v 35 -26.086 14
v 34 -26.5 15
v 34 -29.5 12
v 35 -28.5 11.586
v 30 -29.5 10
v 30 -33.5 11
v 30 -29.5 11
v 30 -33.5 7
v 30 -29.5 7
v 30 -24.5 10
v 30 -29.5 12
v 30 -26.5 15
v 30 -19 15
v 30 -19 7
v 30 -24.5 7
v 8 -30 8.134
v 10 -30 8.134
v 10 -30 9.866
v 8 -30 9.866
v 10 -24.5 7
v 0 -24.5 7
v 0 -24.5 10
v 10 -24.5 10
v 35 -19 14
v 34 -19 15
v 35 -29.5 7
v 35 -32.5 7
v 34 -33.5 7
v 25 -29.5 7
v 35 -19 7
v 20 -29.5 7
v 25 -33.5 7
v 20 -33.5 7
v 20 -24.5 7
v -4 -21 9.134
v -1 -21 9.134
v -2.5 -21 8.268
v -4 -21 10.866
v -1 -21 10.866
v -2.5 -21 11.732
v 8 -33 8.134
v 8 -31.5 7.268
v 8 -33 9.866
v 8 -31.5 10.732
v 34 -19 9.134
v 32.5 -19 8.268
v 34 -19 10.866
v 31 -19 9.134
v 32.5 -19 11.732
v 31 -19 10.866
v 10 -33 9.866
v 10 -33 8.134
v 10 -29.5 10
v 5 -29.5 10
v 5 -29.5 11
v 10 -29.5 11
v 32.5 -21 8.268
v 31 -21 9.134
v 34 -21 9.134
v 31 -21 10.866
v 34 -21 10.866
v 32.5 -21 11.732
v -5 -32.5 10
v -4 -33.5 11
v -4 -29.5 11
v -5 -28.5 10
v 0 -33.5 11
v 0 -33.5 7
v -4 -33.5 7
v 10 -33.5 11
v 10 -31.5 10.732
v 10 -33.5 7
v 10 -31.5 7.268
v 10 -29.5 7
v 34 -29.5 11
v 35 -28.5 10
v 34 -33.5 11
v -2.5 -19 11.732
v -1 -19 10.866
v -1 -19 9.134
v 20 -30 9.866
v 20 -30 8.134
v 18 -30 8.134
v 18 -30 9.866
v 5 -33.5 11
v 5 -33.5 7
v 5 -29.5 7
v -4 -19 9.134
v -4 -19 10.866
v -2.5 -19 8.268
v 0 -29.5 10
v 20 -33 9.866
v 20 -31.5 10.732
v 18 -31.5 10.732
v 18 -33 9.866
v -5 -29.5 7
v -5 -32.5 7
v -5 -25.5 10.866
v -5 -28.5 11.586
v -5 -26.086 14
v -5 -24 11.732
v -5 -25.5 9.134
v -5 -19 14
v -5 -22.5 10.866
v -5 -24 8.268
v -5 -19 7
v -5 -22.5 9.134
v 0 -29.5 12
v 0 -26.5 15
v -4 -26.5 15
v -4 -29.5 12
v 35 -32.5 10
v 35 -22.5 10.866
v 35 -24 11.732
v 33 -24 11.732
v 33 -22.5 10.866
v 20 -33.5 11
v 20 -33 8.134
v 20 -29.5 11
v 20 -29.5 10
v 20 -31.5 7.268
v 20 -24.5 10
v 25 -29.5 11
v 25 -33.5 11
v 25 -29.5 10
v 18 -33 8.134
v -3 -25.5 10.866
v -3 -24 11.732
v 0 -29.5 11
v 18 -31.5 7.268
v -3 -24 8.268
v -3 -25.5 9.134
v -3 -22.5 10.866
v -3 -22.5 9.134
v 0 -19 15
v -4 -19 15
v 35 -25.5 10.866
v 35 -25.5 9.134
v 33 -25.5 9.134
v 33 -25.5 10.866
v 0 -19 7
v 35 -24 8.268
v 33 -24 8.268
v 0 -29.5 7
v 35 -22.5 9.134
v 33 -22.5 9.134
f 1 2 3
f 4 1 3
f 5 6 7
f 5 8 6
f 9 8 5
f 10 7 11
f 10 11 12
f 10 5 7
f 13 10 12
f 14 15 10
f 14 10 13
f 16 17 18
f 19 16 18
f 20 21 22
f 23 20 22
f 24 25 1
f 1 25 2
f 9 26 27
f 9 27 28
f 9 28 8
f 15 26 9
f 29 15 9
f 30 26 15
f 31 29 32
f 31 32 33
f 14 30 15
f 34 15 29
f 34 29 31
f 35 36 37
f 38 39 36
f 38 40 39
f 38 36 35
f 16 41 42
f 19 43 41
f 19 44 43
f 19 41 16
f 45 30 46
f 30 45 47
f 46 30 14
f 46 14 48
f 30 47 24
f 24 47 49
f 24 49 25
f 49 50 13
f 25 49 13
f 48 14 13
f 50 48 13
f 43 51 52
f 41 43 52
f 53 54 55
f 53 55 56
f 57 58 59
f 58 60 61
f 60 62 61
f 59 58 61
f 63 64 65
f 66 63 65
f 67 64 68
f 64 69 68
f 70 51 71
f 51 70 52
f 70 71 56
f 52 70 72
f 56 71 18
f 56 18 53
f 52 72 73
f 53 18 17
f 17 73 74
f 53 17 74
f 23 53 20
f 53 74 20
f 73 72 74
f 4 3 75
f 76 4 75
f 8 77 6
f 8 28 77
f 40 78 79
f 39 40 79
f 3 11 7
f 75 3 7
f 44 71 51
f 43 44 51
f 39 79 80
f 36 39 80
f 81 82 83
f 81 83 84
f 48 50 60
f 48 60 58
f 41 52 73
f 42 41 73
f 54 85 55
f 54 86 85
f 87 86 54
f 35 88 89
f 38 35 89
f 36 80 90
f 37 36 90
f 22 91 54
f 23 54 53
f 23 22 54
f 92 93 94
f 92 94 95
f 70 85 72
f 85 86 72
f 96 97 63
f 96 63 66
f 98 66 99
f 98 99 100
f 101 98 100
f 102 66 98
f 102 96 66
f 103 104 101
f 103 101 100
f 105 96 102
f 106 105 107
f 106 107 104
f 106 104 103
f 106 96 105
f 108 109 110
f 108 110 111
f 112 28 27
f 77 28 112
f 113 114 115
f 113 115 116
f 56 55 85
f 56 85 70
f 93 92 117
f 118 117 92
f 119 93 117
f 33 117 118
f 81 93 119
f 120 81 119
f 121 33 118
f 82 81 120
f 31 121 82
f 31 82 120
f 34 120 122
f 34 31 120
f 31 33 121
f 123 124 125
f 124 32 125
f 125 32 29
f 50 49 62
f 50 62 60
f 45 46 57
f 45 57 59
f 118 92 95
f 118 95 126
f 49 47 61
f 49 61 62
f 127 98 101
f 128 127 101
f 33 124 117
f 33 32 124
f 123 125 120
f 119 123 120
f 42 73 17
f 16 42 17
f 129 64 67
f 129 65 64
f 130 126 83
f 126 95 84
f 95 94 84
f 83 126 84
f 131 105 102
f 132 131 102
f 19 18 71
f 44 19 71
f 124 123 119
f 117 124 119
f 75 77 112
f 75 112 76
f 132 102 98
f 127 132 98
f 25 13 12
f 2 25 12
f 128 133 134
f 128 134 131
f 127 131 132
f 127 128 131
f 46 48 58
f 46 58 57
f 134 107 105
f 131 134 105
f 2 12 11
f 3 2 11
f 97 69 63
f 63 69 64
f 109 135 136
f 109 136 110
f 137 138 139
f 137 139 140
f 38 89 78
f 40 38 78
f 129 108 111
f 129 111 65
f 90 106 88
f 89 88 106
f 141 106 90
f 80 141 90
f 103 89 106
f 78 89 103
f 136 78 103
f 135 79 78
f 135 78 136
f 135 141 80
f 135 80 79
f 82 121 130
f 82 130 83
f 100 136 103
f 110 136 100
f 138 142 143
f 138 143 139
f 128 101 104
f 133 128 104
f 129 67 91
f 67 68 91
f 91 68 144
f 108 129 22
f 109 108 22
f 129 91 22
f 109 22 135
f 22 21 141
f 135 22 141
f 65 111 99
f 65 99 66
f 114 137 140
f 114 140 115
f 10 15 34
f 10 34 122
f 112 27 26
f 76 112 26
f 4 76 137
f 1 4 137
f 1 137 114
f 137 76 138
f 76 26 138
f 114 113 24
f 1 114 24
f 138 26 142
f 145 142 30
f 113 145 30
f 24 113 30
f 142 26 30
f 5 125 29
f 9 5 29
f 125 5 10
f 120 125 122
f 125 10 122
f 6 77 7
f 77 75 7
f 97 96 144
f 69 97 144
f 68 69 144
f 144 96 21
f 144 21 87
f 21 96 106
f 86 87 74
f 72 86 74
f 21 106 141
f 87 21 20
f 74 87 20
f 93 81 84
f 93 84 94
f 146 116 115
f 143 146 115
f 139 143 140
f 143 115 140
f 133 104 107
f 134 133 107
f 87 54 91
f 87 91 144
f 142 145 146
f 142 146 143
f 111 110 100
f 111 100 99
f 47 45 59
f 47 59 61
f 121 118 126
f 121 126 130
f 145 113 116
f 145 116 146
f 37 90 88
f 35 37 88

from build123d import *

# Parameters (mm, degrees)
F0_W       = 4
F0_H       = 3.0000000403
F1_DEPTH   = 5
F2_DEPTH   = 10
F3_W       = 5
F3_H       = 3.0000000403
F4_DEPTH   = 4
F5_W       = 5
F5_H       = 4
F6_DEPTH   = 1
F8_DEPTH   = 2
F10_DEPTH  = 2
F12_DEPTH  = 2
F13_W      = 5
F13_H      = 4
F14_DEPTH  = 1
F17_DEPTH  = 4
F18_SIZE   = 1
F18_2_SIZE = 1


with BuildPart() as f1:
    # F0 (on Right) → F1 (new body)
    with BuildSketch(Plane.YZ):
        Polygon((-29.4999998615, 7.0000000403), (-24.4999998615, 7.0000000403), (-24.4999998615, 10.0000000805), (-26.9999998615, 10.0000000805), (-29.4999998615, 10.0000000805), align=None)
        Polygon((-24.4999998615, 10.0000000805), (-24.4999998615, 7.0000000403), (-18.9999998615, 7.0000000403), (-18.9999998615, 13.0000000805), (-26.9999998615, 13.0000000805), (-26.9999998615, 10.0000000805), align=None)
        with Locations((-31.4999998615, 8.5000000604)):
            Rectangle(F0_W, F0_H)
        Polygon((-29.4999998615, 10.0000000805), (-26.9999998615, 10.0000000805), (-26.9999998615, 13.0000000805), (-18.9999998615, 13.0000000805), (-18.9999998615, 15.0000000805), (-26.4999998615, 15.0000000805), (-29.4999998615, 12.0000000805), align=None)
    extrude(amount=-F1_DEPTH)

    # F0 (on Right) → F2 (join)
    with BuildSketch(Plane.YZ):
        Polygon((-29.4999998615, 7.0000000403), (-24.4999998615, 7.0000000403), (-24.4999998615, 10.0000000805), (-26.9999998615, 10.0000000805), (-29.4999998615, 10.0000000805), align=None)
    extrude(amount=F2_DEPTH)

    # F3 (on face) → F4 (join)
    with BuildSketch(Plane.XZ.offset(29.4999998615)):
        with Locations((7.5, 8.5000000604)):
            Rectangle(F3_W, F3_H)
    extrude(amount=F4_DEPTH)

    # F5 (on face) → F6 (join)
    with BuildSketch(Plane.XY.offset(10.0000000805)):
        with Locations((7.5, -31.4999998615)):
            Rectangle(F5_W, F5_H)
    extrude(amount=F6_DEPTH)

    # F7 (on face) → F8 (cut)
    with BuildSketch(Plane.YZ.offset(10)):
        Polygon((-32.9999998615, 9.8660254642), (-32.9999998615, 8.1339746566), (-31.4999998615, 7.2679492528), (-29.9999998615, 8.1339746566), (-29.9999998615, 9.8660254642), (-31.4999998615, 10.732050868), align=None)
    extrude(amount=-F8_DEPTH, mode=Mode.SUBTRACT)

    # F9 (on face) → F10 (cut)
    with BuildSketch(Plane(origin=(0, -18.9999998615, 0), x_dir=(-1, 0, 0), z_dir=(0, 1, 0))):
        Polygon((1, 10.8660254642), (1, 9.1339746566), (2.5, 8.2679492528), (4, 9.1339746566), (4, 10.8660254642), (2.5, 11.732050868), align=None)
    extrude(amount=-F10_DEPTH, mode=Mode.SUBTRACT)

    # F11 (on face) → F12 (cut)
    with BuildSketch(Plane(origin=(-5, 0, 0), x_dir=(0, -1, 0), z_dir=(-1, 0, 0))):
        Polygon((22.4999998615, 10.8660254843), (22.4999998615, 9.1339746768), (23.9999998615, 8.267949273), (25.4999998615, 9.1339746768), (25.4999998615, 10.8660254843), (23.9999998615, 11.7320508881), align=None)
    extrude(amount=-F12_DEPTH, mode=Mode.SUBTRACT)

    # F13 (on face) → F14 (join)
    with BuildSketch(Plane.XY.offset(10.0000000805)):
        with Locations((-2.5, -31.4999998615)):
            Rectangle(F13_W, F13_H)
    extrude(amount=F14_DEPTH)


with BuildPart() as f16_1:
    # F16: instance of F1
    add(f1.part.mirror(Plane.YZ.offset(15)))

    # F17 (add): a face of the model
    f17_faces = [f16_1.faces().sort_by_distance(p)[0] for p in [
        (22, -31.4999998615, 9.0000000604),
    ]]
    extrude(f17_faces, amount=F17_DEPTH)

    # F18#2
    f18_2_edges = [f16_1.edges().sort_by_distance(p)[0] for p in [
        (35, -33.5, 9),
        (35, -31.5, 11),
        (35, -29.5, 11.5),
        (35, -28, 13.5),
        (35, -22.75, 15),
    ]]
    chamfer(f18_2_edges, length=F18_2_SIZE)


with BuildPart() as f1_1:
    add(f1.part)

    # F18
    f18_edges = [f1_1.edges().sort_by_distance(p)[0] for p in [
        (-5, -22.75, 15),
        (-5, -28, 13.5),
        (-5, -31.5, 11),
        (-5, -33.5, 9),
        (-5, -29.5, 11.5),
    ]]
    chamfer(f18_edges, length=F18_SIZE)


solid = Compound([f16_1.part, f1_1.part])
